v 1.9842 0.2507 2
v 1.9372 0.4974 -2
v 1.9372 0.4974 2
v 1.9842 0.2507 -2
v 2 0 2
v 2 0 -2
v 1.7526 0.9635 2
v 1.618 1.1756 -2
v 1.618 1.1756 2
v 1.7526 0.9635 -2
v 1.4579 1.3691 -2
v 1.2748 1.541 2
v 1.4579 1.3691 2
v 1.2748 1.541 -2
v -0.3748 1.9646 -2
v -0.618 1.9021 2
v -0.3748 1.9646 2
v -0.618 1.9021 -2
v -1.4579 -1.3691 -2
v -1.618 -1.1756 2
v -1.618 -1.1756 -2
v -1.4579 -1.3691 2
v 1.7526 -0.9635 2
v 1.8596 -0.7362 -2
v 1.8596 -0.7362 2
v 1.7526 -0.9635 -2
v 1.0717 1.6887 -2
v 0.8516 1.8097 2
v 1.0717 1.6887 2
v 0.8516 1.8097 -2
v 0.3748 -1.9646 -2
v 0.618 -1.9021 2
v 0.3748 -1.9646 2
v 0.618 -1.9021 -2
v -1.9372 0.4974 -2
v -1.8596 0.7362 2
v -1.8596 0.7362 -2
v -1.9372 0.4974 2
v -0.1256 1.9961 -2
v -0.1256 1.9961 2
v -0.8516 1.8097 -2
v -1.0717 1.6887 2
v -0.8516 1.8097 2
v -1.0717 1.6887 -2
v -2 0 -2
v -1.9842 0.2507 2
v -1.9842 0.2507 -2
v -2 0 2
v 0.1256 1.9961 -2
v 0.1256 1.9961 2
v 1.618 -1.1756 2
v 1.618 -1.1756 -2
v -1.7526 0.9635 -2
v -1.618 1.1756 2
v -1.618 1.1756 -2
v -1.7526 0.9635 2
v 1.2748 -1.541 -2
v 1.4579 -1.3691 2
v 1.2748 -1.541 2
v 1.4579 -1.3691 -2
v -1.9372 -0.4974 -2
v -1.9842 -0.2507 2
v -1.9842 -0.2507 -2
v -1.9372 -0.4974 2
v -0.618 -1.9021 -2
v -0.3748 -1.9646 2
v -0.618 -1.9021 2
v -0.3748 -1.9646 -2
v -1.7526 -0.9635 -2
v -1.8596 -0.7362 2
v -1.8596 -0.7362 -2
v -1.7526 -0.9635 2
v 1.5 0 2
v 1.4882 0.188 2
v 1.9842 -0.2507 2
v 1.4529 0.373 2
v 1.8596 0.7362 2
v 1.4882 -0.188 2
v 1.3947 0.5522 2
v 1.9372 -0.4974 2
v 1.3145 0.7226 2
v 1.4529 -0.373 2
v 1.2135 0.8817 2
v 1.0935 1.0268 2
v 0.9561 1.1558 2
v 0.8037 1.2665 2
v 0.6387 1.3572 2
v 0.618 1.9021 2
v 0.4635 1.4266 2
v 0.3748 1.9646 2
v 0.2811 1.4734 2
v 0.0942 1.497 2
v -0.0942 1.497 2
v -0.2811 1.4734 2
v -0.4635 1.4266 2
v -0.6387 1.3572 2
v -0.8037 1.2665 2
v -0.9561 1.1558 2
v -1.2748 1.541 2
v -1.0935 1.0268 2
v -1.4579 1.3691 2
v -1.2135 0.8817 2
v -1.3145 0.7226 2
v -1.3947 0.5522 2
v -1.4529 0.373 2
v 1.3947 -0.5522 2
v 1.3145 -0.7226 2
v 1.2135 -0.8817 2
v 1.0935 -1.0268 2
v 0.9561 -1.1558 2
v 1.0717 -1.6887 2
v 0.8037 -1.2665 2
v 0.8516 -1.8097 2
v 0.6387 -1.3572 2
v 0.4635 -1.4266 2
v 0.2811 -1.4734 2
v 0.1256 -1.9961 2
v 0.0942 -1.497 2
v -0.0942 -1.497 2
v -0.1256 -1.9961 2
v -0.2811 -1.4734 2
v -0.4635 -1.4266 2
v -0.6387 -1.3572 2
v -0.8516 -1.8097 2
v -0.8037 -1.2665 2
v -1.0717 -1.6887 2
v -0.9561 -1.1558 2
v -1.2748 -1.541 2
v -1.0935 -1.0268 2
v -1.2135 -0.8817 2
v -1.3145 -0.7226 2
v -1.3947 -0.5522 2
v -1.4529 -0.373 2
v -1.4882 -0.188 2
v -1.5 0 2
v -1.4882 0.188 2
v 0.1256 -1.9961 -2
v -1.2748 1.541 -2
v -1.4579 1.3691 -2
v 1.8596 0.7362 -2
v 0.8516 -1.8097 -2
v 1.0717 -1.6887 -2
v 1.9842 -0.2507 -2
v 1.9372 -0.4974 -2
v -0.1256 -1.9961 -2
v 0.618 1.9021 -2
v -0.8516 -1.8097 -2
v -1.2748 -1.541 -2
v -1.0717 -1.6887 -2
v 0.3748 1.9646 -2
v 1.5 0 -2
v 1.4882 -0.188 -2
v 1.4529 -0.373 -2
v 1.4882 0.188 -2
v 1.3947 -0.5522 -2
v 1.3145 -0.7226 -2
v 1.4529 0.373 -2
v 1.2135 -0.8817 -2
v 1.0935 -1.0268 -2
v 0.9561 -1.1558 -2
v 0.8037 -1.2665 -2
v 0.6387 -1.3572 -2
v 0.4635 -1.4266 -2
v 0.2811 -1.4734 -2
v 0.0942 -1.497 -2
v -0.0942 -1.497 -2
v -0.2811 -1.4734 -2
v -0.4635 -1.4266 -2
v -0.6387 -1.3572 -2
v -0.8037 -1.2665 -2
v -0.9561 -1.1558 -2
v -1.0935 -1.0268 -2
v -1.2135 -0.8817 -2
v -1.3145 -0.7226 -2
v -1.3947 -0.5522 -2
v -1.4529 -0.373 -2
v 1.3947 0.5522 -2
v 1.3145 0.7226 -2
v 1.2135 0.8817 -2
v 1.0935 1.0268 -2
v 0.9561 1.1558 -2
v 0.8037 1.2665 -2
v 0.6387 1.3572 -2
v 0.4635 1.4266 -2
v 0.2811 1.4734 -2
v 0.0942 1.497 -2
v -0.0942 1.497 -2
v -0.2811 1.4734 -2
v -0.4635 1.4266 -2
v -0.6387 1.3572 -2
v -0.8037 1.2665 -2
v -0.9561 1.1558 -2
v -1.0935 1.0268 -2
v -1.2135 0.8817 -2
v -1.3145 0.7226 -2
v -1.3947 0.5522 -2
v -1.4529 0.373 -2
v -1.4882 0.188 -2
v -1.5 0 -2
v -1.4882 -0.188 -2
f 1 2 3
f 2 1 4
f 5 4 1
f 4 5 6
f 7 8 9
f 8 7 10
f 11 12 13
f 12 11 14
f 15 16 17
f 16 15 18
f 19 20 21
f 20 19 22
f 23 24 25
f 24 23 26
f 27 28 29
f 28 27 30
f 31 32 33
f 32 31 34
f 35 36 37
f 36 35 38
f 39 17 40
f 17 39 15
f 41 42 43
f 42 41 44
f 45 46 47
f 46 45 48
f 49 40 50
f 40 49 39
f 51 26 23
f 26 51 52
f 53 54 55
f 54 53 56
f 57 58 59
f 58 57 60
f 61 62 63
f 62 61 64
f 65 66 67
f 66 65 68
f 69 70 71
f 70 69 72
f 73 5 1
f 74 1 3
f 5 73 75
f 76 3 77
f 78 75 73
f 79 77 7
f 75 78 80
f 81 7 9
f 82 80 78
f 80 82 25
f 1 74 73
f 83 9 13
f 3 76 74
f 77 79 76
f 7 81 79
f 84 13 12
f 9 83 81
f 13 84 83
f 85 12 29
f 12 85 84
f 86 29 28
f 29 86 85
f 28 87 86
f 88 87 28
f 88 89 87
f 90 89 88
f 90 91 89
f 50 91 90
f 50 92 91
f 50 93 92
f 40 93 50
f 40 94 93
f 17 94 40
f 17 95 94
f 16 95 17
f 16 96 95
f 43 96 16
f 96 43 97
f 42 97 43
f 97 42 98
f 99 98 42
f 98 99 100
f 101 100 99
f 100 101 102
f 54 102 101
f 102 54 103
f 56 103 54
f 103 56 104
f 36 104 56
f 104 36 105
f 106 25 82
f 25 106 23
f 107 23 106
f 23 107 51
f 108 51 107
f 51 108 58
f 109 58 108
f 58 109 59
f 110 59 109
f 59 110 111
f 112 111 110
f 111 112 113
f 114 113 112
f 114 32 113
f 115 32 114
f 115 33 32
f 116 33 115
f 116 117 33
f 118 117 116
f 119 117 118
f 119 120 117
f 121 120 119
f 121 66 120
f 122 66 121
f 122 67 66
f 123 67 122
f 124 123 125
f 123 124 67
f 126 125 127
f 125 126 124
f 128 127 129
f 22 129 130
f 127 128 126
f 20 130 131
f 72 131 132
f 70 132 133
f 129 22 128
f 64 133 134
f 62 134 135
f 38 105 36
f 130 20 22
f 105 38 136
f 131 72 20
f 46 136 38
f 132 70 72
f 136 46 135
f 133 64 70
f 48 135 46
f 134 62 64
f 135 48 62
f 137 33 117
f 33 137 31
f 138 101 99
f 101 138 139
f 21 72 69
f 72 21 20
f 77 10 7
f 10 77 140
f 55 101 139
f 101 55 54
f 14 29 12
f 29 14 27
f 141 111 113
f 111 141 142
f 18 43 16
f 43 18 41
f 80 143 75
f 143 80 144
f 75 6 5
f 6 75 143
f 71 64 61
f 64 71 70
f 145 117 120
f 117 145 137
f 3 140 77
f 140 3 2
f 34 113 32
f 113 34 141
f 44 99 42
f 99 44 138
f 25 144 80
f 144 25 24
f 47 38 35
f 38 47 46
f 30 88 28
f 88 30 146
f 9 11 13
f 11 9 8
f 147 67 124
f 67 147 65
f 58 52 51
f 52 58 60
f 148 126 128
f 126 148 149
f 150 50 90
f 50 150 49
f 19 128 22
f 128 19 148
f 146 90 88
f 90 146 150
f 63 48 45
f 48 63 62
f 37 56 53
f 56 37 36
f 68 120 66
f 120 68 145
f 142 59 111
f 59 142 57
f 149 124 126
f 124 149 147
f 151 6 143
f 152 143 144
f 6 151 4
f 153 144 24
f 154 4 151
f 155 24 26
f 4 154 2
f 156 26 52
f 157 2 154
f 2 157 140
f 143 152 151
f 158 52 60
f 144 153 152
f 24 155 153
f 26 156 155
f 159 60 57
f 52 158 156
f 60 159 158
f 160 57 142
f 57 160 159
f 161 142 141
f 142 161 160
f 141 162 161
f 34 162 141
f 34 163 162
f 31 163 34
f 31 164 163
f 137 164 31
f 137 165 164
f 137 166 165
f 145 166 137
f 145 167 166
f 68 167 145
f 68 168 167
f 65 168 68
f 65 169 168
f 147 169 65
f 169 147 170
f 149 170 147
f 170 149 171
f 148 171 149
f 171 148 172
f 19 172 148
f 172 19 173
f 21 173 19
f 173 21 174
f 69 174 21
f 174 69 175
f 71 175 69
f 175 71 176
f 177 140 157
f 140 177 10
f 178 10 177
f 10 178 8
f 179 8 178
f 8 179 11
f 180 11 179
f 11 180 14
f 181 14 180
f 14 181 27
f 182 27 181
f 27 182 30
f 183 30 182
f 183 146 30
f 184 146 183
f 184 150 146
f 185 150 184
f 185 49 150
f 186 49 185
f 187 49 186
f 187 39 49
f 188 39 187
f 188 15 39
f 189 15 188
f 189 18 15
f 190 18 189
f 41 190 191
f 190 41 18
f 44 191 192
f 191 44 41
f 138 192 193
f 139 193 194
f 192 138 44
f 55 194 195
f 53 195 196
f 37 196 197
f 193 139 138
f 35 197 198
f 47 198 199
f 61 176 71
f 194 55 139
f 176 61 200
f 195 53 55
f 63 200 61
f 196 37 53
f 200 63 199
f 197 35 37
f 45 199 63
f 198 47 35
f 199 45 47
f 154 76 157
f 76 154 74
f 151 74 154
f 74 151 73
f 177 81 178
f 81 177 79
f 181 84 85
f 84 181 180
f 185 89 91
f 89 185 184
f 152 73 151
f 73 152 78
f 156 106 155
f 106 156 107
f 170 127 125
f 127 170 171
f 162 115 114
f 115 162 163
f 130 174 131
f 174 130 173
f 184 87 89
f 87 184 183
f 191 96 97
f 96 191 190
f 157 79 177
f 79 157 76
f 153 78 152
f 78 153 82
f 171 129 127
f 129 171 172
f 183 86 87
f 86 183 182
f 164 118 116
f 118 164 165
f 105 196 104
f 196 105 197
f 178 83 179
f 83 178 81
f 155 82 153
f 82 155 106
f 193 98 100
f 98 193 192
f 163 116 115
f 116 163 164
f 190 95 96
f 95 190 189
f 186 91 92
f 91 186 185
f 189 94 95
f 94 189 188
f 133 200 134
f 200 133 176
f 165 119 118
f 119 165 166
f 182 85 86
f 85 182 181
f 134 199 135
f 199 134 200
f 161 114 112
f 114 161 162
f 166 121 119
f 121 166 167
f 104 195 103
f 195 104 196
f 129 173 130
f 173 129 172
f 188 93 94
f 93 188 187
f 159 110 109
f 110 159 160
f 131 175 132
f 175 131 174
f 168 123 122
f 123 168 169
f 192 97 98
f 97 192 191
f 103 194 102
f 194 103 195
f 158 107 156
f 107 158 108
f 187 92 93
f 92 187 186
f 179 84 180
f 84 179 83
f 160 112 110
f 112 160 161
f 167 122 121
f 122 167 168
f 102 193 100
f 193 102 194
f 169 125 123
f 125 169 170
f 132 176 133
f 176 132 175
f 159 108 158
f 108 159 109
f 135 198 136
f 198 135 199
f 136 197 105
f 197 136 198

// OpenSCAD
$fn = 50;


difference() {
	union() {
		translate(v = [0, 0, -2.0000000000]) {
			cylinder(h = 4, r = 2.0000000000);
		}
	}
	union() {
		translate(v = [0, 0, -100.0000000000]) {
			cylinder(h = 200, r = 1.5000000000);
		}
	}
}
